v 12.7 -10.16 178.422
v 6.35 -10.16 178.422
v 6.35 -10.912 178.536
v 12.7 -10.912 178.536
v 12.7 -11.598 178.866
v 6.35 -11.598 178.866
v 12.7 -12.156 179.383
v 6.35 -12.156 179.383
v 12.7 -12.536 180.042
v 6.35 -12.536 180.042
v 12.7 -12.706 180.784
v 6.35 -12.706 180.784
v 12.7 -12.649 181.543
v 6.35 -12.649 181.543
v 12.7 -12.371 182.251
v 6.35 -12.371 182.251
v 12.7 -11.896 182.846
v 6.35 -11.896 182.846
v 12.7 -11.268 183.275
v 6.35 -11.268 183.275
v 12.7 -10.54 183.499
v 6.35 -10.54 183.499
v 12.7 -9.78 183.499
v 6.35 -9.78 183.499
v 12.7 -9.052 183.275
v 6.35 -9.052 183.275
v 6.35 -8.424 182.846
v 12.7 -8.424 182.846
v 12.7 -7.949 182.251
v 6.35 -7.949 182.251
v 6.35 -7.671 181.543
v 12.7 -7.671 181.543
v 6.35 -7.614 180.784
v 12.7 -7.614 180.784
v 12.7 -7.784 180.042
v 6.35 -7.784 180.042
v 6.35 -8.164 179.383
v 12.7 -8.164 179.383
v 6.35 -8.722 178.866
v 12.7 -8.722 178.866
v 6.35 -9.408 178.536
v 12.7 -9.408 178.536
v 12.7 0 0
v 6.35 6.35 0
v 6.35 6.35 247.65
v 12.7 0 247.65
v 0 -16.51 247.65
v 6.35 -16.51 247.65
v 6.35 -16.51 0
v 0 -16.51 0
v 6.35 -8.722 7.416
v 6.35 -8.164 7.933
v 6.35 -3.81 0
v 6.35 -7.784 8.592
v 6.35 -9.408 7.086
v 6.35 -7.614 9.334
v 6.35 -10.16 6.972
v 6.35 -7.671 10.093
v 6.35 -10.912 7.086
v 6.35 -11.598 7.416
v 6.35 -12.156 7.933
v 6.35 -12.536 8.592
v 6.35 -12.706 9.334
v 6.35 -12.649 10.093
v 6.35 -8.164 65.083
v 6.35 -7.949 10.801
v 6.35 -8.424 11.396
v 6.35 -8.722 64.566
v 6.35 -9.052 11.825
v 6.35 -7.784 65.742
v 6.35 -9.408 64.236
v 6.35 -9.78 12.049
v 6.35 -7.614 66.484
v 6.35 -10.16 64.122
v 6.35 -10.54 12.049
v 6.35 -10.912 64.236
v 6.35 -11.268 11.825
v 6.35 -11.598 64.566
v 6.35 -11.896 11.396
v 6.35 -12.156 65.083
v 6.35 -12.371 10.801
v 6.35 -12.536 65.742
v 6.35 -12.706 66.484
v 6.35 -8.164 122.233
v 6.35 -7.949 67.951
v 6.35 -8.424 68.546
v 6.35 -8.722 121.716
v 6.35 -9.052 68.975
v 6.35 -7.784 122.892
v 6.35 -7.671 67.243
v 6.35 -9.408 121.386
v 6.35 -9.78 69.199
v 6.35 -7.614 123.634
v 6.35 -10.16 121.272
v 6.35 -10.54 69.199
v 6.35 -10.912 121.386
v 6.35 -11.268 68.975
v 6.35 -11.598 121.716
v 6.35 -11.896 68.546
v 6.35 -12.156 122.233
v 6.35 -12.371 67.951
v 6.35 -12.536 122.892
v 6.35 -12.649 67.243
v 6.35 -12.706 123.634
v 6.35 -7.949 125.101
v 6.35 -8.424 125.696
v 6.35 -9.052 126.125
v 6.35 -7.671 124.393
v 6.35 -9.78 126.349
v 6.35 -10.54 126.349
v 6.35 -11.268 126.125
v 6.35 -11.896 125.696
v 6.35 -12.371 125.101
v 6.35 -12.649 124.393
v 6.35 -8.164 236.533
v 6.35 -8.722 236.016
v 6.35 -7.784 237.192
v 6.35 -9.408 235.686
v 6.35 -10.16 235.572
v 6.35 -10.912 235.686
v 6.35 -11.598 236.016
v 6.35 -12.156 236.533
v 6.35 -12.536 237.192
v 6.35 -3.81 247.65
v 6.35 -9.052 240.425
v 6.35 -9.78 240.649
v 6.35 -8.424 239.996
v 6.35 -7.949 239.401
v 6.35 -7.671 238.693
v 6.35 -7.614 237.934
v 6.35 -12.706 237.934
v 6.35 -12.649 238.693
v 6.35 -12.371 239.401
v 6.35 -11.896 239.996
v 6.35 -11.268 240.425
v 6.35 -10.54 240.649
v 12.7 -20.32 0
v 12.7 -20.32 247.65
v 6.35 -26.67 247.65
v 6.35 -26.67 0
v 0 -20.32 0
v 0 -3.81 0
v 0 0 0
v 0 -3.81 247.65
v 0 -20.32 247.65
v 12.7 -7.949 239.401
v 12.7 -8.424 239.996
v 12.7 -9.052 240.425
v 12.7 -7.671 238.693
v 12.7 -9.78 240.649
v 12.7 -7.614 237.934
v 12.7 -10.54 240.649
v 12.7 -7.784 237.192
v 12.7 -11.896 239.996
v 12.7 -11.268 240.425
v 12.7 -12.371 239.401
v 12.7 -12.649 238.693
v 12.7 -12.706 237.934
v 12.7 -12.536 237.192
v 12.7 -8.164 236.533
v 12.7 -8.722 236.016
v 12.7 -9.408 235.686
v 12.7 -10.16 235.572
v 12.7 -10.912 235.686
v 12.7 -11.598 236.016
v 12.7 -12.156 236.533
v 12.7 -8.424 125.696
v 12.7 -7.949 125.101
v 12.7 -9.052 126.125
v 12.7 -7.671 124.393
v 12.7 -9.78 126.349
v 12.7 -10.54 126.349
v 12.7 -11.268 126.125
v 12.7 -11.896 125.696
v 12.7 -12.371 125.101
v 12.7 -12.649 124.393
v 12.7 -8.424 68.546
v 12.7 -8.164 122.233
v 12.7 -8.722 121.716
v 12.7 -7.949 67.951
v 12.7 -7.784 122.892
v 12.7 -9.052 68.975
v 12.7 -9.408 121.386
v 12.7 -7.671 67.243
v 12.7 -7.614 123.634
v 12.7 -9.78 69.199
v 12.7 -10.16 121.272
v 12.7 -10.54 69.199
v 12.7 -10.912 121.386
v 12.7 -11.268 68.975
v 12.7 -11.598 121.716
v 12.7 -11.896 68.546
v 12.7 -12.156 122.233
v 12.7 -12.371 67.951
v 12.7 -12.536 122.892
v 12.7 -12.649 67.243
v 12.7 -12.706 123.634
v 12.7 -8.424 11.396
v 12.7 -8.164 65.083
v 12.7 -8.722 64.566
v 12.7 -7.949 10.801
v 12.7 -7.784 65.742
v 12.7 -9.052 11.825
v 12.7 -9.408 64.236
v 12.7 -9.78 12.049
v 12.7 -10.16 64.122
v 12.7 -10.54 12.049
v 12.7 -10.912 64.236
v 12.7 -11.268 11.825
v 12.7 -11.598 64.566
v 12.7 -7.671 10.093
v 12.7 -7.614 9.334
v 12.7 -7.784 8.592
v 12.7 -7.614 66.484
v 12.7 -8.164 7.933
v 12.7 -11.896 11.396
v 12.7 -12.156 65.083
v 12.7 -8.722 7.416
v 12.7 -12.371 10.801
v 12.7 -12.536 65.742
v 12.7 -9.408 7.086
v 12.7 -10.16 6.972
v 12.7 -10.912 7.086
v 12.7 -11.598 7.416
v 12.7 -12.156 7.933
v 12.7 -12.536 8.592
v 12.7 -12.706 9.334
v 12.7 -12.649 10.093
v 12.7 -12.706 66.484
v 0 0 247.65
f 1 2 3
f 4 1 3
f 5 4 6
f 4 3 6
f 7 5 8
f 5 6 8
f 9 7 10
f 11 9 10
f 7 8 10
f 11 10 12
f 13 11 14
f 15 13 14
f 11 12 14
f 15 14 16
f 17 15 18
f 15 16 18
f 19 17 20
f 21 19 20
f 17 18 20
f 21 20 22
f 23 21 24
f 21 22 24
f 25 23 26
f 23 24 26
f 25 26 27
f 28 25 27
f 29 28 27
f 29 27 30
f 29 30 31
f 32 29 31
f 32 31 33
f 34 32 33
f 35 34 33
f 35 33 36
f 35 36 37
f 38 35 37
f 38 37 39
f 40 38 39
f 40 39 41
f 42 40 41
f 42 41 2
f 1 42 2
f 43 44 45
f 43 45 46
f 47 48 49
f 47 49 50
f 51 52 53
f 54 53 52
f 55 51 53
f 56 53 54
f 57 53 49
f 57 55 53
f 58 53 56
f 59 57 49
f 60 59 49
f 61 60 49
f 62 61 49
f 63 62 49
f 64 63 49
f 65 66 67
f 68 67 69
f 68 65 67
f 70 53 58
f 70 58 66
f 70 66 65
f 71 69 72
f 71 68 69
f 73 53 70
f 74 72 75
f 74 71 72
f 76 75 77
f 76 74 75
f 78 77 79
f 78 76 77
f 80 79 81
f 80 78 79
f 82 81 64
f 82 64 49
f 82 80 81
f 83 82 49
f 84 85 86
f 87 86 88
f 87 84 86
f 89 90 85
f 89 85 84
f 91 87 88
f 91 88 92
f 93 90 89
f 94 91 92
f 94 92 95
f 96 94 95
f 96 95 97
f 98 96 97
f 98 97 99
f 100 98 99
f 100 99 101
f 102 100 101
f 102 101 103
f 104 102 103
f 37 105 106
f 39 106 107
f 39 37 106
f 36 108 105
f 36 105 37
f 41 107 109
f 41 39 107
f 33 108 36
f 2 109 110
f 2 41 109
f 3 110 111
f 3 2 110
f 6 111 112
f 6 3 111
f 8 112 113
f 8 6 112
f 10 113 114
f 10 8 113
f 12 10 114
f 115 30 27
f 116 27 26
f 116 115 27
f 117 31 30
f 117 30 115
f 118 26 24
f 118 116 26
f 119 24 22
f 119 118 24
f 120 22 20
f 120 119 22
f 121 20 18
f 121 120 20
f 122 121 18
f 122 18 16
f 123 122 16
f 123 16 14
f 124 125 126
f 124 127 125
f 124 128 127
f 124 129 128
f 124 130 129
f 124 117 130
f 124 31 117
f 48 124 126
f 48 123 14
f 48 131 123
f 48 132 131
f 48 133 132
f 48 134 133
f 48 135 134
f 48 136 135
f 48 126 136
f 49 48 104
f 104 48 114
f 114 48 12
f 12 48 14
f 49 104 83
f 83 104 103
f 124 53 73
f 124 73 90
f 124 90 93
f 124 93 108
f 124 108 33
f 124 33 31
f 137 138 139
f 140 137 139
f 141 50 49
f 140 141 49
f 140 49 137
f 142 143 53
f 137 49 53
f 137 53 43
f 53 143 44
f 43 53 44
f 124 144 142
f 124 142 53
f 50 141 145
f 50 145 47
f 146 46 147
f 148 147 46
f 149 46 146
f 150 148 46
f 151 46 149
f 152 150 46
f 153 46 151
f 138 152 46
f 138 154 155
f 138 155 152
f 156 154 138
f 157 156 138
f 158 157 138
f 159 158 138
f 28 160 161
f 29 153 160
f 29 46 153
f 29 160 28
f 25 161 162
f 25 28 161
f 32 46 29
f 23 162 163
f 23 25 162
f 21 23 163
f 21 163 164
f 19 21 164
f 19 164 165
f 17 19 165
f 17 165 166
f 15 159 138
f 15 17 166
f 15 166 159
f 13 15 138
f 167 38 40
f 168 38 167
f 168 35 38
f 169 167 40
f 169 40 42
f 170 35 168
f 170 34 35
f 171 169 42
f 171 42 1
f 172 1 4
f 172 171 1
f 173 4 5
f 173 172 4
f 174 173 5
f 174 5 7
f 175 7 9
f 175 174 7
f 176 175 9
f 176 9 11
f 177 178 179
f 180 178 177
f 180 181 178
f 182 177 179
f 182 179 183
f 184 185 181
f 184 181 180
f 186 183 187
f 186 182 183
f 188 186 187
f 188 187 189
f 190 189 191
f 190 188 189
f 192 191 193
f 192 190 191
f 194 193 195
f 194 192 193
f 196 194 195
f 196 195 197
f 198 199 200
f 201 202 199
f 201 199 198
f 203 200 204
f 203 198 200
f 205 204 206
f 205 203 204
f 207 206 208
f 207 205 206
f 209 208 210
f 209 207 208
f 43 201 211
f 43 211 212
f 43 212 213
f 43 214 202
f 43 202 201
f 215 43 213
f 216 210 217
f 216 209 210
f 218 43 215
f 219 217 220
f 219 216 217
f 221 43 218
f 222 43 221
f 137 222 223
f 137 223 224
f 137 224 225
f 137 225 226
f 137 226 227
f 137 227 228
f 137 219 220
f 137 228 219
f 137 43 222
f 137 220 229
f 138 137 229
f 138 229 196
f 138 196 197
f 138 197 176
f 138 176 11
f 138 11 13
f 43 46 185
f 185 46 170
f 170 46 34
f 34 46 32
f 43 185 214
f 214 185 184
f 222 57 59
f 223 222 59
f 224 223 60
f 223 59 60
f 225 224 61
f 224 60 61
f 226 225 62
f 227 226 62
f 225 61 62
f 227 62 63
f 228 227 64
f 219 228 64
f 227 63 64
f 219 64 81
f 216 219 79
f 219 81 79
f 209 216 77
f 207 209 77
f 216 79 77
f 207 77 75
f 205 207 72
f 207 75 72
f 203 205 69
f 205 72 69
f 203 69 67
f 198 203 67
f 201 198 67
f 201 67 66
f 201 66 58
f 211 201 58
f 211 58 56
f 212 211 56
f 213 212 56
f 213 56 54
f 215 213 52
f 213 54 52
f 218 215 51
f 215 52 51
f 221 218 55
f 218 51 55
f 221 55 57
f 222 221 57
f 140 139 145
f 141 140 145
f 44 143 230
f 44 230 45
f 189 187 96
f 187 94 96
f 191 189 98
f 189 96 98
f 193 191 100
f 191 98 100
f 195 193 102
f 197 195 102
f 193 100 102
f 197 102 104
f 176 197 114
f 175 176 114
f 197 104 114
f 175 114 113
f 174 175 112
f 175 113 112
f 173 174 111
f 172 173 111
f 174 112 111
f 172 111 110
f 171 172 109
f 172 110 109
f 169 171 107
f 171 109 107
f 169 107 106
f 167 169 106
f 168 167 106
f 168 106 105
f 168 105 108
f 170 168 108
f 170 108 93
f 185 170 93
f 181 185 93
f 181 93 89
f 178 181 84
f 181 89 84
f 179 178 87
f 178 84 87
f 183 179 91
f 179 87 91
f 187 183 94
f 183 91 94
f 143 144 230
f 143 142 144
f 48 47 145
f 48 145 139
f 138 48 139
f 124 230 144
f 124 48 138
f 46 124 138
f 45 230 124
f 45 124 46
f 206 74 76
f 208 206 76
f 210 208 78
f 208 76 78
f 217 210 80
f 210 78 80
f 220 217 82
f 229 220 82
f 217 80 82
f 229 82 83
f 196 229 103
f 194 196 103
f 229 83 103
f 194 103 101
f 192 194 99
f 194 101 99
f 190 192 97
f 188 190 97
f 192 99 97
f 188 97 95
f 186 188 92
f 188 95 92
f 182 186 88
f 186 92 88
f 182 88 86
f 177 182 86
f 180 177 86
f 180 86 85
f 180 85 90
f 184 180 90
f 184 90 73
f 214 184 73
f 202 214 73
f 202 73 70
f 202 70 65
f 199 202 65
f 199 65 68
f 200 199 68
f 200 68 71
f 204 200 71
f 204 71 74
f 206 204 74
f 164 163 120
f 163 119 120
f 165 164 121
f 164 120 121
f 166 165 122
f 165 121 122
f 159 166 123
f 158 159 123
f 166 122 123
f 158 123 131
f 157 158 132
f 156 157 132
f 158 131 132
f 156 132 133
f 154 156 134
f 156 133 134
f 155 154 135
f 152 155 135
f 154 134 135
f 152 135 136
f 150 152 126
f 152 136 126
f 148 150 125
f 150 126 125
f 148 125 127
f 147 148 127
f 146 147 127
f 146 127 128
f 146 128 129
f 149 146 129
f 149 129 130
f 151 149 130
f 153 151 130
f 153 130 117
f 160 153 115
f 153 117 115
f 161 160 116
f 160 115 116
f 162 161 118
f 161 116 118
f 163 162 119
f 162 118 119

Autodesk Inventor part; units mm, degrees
ref_plane "YZ Plane" through (0, 0, 0) normal (1, 0, 0) x (0, 1, 0)
sketch "Sketch1" plane through (0, 0, 0) normal (0, 0, 1) x (1, 0, 0)
  line L0 (0, 0) -> (12.7, 0)
  line L1 (12.7, 0) -> (12.7, -20.32)
  line L2 (12.7, -20.32) -> (0, -20.32)
  line L3 (0, -20.32) -> (0, 0)
  line L4 (0, 0) -> (6.35, 6.35)
  line L5 (12.7, -20.32) -> (6.35, -26.67)
  line L6 (6.35, -26.67) -> (0, -20.32)
  line L7 (6.35, 6.35) -> (12.7, 0)
  dimension "d0" = 90
  dimension "d1" = 90
  dimension "d2" = 33.02
  dimension "d3" = 12.7
extrude "Extrusion1" add sketch "Sketch1" along normal blind 247.65
sketch "Sketch6" plane through (0, 0, 247.65) normal (0, 0, 1) x (1, 0, 0)
  line L0 (-5.8804, -3.81) -> (6.35, -3.81)
  line L1 (6.35, -3.81) -> (6.35, -16.51)
  line L2 (6.35, -16.51) -> (-5.8804, -16.51)
  line L3 (-5.8804, -16.51) -> (-5.8804, -3.81)
  line L4 (12.7, -20.32) -> (12.7, 0) projected
  line L5 (0, 0) -> (0, -20.32) projected
  point P0 (6.35, -10.16)
  point P1 (12.7, -10.16)
  dimension "d43" = 12.7
  dimension "d44" = 6.35
extrude "Extrusion5" cut sketch "Sketch6" against normal through all
ref_plane "Work Plane1" through (6.35, -20.32, 0) normal (1, 0, 0) x (0, 0, -1)
ref_plane "Work Plane2" through (0, -10.16, 0) normal (0, 1, 0) x (-1, 0, 0)
sketch "Sketch2" plane through (12.7, -20.32, 0) normal (1, 0, 0) x (0, 0, -1)
  line L0 (-247.65, 0) -> (-247.65, 20.32) projected
  line L1 (0, 20.32) -> (-247.65, 20.32) projected
  line L2 (0, 20.32) -> (0, 0) projected
  line L3 (0, 0) -> (-247.65, 0) projected
  circle A0 centre (-238.125, 10.16) radius 4.7625
  circle A1 centre (-9.525, 10.16) radius 4.7625
  line L4 (-233.3625, 16.7388) -> (-233.3625, 5.4122)
  line L5 (-14.2875, 15.6909) -> (-14.2875, 3.5669)
  point P0 (0, 10.16)
  point P1 (-180.975, 10.16)
  point P2 (-66.675, 10.16)
  point P3 (-123.825, 10.16)
  dimension "d28" = 9.525
  dimension "d47" = 9.525
  dimension "d48" = 57.15
  dimension "d49" = 57.15
  dimension "d51" = 9.525
  dimension "d52" = 219.075
  dimension "d56" = 57.15
  dimension "d59" = 228.6
  dimension "d60" = 57.15
hole "Hole2" at (12.7, -10.16, 9.525) at (12.7, -10.16, 180.975) at (12.7, -10.16, 66.675) at (12.7, -10.16, 238.125) at (12.7, -10.16, 123.825) direction (-1, 0, 0) diameter 5.1054 end through all clearance for "Flat Head Machine Screw (82)" size "#10" standard "Ansi Unified Screw Threads"
properties part number "SC Path" material "Aluminum 6061"
